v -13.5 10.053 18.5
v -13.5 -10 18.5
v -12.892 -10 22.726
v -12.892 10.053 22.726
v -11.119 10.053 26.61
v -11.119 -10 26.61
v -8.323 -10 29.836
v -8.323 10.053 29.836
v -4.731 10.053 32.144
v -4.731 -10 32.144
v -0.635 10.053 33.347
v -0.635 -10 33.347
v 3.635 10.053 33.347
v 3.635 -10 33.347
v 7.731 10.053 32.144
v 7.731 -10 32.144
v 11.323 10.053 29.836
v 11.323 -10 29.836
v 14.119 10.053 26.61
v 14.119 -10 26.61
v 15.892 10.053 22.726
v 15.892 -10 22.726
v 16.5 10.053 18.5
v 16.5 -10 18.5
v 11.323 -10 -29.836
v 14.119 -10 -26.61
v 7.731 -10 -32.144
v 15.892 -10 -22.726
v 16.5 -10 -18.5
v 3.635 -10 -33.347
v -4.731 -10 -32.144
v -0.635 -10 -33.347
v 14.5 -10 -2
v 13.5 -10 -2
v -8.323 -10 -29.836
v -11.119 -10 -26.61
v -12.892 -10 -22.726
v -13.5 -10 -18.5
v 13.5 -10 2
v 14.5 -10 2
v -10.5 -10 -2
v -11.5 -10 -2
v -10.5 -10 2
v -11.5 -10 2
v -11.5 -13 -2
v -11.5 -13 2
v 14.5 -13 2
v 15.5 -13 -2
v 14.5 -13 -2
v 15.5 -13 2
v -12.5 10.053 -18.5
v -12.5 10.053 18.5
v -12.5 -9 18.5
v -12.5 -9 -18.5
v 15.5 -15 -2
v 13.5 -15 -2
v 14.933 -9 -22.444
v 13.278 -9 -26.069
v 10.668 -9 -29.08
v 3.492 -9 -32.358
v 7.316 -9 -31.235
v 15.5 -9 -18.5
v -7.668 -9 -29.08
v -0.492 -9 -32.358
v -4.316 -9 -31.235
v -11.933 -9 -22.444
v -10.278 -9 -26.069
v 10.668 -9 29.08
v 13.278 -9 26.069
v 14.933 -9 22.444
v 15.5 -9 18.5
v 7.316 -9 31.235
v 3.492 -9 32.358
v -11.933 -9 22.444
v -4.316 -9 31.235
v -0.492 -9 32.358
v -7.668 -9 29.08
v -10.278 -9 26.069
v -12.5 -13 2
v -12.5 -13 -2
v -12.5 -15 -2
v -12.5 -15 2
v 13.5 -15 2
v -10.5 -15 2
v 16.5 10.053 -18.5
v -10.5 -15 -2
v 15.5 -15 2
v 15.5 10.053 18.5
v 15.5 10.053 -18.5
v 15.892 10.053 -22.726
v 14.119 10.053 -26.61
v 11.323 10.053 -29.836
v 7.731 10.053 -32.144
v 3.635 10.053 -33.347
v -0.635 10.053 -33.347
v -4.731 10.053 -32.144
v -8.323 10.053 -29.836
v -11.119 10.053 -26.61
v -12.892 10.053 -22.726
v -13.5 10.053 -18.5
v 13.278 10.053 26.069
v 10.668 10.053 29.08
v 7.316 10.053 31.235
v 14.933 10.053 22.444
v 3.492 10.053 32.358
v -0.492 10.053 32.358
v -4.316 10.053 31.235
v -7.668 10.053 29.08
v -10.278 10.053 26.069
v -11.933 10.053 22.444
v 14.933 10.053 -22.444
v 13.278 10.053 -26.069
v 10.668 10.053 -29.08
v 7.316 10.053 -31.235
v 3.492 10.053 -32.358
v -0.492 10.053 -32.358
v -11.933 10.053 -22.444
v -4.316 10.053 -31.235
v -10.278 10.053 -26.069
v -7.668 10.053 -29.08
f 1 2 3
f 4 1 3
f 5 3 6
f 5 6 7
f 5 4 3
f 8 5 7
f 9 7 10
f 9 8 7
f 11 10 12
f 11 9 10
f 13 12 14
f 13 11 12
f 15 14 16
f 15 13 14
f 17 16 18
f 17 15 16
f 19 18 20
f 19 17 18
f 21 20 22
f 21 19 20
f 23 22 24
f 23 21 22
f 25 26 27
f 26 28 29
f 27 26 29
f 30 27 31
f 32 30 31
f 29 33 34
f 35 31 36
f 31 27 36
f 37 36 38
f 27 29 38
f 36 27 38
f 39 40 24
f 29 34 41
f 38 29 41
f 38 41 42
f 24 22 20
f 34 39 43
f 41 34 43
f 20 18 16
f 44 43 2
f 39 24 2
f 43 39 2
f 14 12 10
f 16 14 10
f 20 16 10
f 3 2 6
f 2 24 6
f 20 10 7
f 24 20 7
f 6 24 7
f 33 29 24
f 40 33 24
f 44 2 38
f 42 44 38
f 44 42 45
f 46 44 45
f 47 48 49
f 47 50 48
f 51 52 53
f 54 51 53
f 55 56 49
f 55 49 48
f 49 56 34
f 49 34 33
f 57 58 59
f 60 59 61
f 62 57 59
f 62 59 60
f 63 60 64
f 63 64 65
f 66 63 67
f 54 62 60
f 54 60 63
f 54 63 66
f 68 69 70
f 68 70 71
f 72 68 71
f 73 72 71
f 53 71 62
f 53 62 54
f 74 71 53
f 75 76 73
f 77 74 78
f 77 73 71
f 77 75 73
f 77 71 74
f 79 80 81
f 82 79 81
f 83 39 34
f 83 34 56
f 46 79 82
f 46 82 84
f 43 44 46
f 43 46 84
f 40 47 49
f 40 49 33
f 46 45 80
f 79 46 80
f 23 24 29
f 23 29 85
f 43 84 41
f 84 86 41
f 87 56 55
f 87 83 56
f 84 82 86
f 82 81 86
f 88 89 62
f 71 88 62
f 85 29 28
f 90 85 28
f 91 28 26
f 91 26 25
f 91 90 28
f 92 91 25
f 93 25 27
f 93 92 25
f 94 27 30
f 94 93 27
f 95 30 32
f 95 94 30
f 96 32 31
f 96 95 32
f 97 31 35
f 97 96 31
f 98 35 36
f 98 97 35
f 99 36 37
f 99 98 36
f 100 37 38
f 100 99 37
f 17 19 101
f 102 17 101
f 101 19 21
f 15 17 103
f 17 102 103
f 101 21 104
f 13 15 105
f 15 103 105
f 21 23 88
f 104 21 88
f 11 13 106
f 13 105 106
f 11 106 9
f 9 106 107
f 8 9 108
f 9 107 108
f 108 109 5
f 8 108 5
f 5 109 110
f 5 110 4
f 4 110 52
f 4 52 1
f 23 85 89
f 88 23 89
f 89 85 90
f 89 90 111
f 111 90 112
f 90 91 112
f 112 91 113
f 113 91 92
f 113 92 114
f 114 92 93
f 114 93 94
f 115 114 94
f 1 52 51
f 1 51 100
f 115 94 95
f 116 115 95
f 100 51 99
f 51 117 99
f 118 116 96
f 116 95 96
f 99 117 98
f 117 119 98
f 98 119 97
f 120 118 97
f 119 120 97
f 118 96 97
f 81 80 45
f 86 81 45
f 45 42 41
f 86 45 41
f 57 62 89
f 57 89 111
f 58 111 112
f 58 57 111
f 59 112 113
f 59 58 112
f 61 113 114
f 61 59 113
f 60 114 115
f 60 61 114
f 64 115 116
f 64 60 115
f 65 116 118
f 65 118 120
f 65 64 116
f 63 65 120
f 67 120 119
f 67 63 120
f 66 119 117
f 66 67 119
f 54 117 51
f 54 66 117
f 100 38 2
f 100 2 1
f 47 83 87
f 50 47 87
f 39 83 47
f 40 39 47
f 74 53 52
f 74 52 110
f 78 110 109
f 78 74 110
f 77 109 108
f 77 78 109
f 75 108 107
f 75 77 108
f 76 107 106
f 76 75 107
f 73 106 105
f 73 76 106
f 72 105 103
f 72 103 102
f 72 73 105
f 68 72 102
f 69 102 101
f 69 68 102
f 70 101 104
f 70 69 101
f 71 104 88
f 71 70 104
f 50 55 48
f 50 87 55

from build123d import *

# Parameters (mm, degrees)
SKETCH1_W           = 1
SKETCH1_H           = 20.053205005
BOSS_EXTRUDE2_DEPTH = 1
BOSS_EXTRUDE4_DEPTH = 2


with BuildPart() as part:
    # Sweep9: sweep along a path in Sketch2
    with BuildLine(Plane(origin=(0, 0, 0), x_dir=(1, 0, 0), z_dir=(0, 1, 0))) as sweep9_path:
        Line((15.5, -18.5), (15.5, 18.5))
        ThreePointArc((15.5, 18.5), (1.5, 32.5), (-12.5, 18.5))
        Line((-12.5, 18.5), (-12.5, -18.5))
        ThreePointArc((-12.5, -18.5), (1.5, -32.5), (15.5, -18.5))
    # Sketch1 → Sweep9 (sweep)
    with BuildSketch(Plane.XY):
        with Locations((16, 0.026602503)):
            Rectangle(SKETCH1_W, SKETCH1_H)
    sweep(path=sweep9_path.line)

    # Sketch6 → Boss-Extrude2 (add)
    with BuildSketch(Plane.XZ.offset(10)):
        with BuildLine():
            Line((15.5, 0), (15.5, -18.5))
            ThreePointArc((15.5, -18.5), (1.5, -32.5), (-12.5, -18.5))
            Line((-12.5, -18.5), (-12.5, 18.5))
            ThreePointArc((-12.5, 18.5), (1.5, 32.5), (15.5, 18.5))
            Line((15.5, 18.5), (15.5, 0))
        make_face()
    extrude(amount=-BOSS_EXTRUDE2_DEPTH)

    # Sketch8 → Boss-Extrude4 (add, symmetric)
    with BuildSketch(Plane.XY):
        Polygon((-12.5, -13), (-12.5, -15), (-10.5, -15), (-10.5, -10), (-11.5, -10), (-11.5, -13), align=None)
        Polygon((15.5, -13), (14.5, -13), (14.5, -10), (13.5, -10), (13.5, -15), (15.5, -15), align=None)
    extrude(amount=BOSS_EXTRUDE4_DEPTH, both=True)


solid = part.part
